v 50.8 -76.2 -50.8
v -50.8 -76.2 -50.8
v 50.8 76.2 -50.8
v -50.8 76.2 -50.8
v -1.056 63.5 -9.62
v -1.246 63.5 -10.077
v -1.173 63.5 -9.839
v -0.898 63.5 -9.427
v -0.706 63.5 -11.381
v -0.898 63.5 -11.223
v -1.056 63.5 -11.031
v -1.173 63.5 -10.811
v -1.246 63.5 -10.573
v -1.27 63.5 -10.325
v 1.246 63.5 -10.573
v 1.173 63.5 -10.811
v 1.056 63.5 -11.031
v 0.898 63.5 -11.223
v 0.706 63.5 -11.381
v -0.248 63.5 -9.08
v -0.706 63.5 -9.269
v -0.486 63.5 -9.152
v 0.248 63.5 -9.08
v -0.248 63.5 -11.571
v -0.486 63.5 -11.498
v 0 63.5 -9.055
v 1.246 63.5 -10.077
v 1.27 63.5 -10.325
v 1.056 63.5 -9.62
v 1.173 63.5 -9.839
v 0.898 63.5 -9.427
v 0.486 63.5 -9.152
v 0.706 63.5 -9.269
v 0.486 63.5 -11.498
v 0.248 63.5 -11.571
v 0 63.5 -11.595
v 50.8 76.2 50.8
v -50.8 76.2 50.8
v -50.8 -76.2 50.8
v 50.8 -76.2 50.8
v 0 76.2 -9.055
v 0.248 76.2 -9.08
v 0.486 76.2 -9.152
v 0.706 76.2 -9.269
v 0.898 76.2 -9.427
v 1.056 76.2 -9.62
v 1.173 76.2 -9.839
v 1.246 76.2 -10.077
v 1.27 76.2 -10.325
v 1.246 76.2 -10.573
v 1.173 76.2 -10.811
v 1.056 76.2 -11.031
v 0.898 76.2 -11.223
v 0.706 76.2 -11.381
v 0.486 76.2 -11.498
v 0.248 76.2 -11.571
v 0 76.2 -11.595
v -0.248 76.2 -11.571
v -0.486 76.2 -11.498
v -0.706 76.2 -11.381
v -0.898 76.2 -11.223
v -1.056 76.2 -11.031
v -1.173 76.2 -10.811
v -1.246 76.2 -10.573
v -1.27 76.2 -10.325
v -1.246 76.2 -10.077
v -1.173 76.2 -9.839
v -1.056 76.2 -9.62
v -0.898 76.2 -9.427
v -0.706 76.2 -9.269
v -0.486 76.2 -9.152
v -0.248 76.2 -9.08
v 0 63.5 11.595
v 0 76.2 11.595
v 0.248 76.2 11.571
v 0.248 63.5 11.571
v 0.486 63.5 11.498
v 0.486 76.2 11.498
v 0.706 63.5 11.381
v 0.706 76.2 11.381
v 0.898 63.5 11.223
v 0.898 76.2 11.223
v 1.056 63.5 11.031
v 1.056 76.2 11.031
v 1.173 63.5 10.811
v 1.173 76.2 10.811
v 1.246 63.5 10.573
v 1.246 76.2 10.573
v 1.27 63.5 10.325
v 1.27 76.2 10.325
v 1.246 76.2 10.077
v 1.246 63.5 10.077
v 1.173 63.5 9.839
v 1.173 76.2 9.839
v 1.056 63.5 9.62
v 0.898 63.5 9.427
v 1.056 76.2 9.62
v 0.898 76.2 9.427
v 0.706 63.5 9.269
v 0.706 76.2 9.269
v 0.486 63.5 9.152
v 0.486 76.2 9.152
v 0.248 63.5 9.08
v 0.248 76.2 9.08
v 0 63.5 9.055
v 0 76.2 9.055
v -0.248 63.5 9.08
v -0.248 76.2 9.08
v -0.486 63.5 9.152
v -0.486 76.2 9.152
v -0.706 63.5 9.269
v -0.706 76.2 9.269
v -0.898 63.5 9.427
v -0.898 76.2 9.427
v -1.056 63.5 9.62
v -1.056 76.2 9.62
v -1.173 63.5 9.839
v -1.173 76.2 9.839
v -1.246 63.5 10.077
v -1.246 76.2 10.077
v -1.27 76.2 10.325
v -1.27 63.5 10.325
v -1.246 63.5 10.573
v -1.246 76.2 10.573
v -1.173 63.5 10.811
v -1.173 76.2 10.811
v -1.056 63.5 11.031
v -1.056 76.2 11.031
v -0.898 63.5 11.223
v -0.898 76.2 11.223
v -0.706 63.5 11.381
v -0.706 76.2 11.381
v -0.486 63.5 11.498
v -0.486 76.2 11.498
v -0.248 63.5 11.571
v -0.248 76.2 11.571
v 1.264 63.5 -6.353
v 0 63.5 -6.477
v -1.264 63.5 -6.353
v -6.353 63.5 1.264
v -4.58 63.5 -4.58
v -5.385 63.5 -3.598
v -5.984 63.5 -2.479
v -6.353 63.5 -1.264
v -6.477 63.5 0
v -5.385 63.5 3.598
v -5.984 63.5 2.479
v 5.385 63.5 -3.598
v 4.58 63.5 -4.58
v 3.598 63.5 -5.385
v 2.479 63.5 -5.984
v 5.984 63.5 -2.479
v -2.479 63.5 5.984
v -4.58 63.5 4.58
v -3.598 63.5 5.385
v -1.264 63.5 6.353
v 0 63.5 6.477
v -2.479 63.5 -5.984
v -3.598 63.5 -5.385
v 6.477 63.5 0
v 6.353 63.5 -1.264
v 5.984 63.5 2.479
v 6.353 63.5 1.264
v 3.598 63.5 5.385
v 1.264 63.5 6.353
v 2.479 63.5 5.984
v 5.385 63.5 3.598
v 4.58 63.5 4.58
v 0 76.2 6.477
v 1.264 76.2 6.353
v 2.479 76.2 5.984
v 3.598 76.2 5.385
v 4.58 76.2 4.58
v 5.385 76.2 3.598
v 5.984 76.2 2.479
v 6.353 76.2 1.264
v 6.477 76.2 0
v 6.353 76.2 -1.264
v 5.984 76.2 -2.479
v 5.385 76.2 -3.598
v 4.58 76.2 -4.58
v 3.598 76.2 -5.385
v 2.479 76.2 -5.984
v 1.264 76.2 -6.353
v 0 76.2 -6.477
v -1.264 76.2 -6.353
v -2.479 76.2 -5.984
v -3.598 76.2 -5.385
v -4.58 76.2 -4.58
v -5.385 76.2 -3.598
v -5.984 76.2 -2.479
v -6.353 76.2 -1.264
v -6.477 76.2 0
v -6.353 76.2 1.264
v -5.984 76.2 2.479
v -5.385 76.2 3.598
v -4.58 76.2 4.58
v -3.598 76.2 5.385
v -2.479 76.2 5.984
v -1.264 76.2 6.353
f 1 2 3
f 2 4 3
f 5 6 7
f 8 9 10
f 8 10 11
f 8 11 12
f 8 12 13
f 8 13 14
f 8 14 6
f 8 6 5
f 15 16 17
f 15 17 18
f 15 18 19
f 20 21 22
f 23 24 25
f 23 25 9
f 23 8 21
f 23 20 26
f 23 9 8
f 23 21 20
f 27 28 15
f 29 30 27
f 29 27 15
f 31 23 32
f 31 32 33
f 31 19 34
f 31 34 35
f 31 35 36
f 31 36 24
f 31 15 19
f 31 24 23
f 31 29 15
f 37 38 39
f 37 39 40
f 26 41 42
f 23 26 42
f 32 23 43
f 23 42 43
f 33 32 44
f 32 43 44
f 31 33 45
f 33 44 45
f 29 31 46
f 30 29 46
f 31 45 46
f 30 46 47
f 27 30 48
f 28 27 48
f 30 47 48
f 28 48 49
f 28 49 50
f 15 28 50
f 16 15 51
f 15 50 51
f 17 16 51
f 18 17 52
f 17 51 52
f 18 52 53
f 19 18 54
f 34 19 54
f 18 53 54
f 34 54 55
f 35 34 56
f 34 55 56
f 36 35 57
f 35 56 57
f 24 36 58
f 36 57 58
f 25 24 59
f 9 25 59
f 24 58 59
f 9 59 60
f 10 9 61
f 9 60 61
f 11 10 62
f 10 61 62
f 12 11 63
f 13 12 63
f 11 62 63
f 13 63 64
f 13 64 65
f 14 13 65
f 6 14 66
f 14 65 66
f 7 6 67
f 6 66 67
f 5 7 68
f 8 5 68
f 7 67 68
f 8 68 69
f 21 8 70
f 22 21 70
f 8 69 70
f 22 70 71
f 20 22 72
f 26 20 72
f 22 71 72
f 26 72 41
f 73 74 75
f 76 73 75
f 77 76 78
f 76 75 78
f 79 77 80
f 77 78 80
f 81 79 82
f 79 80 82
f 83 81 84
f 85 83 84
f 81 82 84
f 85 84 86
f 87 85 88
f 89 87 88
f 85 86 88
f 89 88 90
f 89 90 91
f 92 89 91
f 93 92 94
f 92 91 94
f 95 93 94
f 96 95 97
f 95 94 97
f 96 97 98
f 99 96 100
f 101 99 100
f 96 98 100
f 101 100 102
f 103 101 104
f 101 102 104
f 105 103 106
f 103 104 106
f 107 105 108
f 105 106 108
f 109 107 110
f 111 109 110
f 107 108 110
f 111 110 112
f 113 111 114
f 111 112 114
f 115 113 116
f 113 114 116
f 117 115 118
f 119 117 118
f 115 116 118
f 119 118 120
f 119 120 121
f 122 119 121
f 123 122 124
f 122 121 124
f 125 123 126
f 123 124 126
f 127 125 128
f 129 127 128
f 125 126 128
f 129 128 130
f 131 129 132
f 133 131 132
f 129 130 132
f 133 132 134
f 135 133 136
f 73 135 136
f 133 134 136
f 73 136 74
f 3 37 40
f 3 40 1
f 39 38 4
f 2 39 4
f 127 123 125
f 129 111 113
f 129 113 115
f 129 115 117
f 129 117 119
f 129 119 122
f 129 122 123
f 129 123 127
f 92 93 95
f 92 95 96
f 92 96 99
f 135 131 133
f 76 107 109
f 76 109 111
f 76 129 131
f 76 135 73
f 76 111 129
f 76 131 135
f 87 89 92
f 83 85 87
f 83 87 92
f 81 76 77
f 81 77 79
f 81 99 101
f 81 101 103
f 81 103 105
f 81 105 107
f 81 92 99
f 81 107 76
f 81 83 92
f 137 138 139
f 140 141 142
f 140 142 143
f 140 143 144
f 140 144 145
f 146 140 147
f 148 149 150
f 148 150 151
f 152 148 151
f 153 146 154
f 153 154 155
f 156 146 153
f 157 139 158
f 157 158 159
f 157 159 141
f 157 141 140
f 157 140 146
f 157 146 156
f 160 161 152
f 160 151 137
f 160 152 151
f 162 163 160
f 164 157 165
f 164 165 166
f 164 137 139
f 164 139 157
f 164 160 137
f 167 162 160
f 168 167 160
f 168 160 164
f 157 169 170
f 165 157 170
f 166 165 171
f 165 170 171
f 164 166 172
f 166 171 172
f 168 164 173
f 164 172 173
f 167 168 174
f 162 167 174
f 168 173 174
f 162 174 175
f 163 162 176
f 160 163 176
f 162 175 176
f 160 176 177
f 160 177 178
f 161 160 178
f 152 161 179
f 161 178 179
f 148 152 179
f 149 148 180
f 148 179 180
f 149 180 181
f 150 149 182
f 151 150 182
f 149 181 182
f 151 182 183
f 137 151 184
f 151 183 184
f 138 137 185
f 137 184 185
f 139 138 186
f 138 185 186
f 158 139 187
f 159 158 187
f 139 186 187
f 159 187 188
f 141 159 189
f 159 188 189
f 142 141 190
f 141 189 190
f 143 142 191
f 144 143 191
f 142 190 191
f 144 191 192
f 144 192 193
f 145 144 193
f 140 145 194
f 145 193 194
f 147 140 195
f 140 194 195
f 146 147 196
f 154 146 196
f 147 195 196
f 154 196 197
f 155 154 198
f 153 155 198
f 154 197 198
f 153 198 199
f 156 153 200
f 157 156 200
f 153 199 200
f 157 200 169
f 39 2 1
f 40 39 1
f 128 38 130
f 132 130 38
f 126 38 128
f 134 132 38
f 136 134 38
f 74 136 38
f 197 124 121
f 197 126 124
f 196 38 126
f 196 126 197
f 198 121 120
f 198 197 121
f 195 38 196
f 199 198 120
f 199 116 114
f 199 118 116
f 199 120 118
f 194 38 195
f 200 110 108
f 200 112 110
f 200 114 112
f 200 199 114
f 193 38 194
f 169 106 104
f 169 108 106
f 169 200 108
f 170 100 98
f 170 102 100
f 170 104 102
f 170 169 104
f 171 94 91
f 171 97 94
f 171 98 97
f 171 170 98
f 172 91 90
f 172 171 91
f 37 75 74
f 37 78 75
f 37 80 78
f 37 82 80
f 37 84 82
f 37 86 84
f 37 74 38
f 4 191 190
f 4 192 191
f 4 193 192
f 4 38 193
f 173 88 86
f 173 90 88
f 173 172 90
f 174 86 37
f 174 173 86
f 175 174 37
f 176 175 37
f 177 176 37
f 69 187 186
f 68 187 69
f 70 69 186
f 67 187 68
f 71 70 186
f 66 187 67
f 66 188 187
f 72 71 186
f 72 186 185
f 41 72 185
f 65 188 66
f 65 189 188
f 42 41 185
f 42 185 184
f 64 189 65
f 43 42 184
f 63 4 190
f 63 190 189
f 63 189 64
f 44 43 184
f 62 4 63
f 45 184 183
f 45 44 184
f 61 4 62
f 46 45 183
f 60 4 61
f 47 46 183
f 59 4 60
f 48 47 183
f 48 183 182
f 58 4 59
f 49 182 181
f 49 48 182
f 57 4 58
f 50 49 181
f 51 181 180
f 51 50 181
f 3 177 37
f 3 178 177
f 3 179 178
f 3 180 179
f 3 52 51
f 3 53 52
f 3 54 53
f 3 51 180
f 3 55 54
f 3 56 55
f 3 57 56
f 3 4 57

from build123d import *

# Parameters (mm, degrees)
SKETCH1_W           = 101.6
SKETCH1_H           = 101.6
BOSS_EXTRUDE1_DEPTH = 76.2
SKETCH2_R           = 6.477
SKETCH2_R_2         = 1.27
CUT_EXTRUDE1_DEPTH  = 12.7


with BuildPart() as part:
    # Sketch1 → Boss-Extrude1 (new, symmetric)
    with BuildSketch(Plane(origin=(0, 0, 0), x_dir=(1, 0, 0), z_dir=(0, 1, 0))):
        Rectangle(SKETCH1_W, SKETCH1_H)
    extrude(amount=BOSS_EXTRUDE1_DEPTH, both=True)

    # Sketch2 → Cut-Extrude1 (cut)
    with BuildSketch(Plane(origin=(0, 76.2, 0), x_dir=(1, 0, 0), z_dir=(0, 1, 0))):
        with Locations(Location((0, 0, 0), (0, 0, 270))):
            Circle(SKETCH2_R)
        with Locations(Location((0, 10.3251, 0), (0, 0, 270))):
            Circle(SKETCH2_R_2)
        with Locations(Location((0, -10.3251, 0), (0, 0, 270))):
            Circle(SKETCH2_R_2)
    extrude(amount=-CUT_EXTRUDE1_DEPTH, mode=Mode.SUBTRACT)


solid = part.part
